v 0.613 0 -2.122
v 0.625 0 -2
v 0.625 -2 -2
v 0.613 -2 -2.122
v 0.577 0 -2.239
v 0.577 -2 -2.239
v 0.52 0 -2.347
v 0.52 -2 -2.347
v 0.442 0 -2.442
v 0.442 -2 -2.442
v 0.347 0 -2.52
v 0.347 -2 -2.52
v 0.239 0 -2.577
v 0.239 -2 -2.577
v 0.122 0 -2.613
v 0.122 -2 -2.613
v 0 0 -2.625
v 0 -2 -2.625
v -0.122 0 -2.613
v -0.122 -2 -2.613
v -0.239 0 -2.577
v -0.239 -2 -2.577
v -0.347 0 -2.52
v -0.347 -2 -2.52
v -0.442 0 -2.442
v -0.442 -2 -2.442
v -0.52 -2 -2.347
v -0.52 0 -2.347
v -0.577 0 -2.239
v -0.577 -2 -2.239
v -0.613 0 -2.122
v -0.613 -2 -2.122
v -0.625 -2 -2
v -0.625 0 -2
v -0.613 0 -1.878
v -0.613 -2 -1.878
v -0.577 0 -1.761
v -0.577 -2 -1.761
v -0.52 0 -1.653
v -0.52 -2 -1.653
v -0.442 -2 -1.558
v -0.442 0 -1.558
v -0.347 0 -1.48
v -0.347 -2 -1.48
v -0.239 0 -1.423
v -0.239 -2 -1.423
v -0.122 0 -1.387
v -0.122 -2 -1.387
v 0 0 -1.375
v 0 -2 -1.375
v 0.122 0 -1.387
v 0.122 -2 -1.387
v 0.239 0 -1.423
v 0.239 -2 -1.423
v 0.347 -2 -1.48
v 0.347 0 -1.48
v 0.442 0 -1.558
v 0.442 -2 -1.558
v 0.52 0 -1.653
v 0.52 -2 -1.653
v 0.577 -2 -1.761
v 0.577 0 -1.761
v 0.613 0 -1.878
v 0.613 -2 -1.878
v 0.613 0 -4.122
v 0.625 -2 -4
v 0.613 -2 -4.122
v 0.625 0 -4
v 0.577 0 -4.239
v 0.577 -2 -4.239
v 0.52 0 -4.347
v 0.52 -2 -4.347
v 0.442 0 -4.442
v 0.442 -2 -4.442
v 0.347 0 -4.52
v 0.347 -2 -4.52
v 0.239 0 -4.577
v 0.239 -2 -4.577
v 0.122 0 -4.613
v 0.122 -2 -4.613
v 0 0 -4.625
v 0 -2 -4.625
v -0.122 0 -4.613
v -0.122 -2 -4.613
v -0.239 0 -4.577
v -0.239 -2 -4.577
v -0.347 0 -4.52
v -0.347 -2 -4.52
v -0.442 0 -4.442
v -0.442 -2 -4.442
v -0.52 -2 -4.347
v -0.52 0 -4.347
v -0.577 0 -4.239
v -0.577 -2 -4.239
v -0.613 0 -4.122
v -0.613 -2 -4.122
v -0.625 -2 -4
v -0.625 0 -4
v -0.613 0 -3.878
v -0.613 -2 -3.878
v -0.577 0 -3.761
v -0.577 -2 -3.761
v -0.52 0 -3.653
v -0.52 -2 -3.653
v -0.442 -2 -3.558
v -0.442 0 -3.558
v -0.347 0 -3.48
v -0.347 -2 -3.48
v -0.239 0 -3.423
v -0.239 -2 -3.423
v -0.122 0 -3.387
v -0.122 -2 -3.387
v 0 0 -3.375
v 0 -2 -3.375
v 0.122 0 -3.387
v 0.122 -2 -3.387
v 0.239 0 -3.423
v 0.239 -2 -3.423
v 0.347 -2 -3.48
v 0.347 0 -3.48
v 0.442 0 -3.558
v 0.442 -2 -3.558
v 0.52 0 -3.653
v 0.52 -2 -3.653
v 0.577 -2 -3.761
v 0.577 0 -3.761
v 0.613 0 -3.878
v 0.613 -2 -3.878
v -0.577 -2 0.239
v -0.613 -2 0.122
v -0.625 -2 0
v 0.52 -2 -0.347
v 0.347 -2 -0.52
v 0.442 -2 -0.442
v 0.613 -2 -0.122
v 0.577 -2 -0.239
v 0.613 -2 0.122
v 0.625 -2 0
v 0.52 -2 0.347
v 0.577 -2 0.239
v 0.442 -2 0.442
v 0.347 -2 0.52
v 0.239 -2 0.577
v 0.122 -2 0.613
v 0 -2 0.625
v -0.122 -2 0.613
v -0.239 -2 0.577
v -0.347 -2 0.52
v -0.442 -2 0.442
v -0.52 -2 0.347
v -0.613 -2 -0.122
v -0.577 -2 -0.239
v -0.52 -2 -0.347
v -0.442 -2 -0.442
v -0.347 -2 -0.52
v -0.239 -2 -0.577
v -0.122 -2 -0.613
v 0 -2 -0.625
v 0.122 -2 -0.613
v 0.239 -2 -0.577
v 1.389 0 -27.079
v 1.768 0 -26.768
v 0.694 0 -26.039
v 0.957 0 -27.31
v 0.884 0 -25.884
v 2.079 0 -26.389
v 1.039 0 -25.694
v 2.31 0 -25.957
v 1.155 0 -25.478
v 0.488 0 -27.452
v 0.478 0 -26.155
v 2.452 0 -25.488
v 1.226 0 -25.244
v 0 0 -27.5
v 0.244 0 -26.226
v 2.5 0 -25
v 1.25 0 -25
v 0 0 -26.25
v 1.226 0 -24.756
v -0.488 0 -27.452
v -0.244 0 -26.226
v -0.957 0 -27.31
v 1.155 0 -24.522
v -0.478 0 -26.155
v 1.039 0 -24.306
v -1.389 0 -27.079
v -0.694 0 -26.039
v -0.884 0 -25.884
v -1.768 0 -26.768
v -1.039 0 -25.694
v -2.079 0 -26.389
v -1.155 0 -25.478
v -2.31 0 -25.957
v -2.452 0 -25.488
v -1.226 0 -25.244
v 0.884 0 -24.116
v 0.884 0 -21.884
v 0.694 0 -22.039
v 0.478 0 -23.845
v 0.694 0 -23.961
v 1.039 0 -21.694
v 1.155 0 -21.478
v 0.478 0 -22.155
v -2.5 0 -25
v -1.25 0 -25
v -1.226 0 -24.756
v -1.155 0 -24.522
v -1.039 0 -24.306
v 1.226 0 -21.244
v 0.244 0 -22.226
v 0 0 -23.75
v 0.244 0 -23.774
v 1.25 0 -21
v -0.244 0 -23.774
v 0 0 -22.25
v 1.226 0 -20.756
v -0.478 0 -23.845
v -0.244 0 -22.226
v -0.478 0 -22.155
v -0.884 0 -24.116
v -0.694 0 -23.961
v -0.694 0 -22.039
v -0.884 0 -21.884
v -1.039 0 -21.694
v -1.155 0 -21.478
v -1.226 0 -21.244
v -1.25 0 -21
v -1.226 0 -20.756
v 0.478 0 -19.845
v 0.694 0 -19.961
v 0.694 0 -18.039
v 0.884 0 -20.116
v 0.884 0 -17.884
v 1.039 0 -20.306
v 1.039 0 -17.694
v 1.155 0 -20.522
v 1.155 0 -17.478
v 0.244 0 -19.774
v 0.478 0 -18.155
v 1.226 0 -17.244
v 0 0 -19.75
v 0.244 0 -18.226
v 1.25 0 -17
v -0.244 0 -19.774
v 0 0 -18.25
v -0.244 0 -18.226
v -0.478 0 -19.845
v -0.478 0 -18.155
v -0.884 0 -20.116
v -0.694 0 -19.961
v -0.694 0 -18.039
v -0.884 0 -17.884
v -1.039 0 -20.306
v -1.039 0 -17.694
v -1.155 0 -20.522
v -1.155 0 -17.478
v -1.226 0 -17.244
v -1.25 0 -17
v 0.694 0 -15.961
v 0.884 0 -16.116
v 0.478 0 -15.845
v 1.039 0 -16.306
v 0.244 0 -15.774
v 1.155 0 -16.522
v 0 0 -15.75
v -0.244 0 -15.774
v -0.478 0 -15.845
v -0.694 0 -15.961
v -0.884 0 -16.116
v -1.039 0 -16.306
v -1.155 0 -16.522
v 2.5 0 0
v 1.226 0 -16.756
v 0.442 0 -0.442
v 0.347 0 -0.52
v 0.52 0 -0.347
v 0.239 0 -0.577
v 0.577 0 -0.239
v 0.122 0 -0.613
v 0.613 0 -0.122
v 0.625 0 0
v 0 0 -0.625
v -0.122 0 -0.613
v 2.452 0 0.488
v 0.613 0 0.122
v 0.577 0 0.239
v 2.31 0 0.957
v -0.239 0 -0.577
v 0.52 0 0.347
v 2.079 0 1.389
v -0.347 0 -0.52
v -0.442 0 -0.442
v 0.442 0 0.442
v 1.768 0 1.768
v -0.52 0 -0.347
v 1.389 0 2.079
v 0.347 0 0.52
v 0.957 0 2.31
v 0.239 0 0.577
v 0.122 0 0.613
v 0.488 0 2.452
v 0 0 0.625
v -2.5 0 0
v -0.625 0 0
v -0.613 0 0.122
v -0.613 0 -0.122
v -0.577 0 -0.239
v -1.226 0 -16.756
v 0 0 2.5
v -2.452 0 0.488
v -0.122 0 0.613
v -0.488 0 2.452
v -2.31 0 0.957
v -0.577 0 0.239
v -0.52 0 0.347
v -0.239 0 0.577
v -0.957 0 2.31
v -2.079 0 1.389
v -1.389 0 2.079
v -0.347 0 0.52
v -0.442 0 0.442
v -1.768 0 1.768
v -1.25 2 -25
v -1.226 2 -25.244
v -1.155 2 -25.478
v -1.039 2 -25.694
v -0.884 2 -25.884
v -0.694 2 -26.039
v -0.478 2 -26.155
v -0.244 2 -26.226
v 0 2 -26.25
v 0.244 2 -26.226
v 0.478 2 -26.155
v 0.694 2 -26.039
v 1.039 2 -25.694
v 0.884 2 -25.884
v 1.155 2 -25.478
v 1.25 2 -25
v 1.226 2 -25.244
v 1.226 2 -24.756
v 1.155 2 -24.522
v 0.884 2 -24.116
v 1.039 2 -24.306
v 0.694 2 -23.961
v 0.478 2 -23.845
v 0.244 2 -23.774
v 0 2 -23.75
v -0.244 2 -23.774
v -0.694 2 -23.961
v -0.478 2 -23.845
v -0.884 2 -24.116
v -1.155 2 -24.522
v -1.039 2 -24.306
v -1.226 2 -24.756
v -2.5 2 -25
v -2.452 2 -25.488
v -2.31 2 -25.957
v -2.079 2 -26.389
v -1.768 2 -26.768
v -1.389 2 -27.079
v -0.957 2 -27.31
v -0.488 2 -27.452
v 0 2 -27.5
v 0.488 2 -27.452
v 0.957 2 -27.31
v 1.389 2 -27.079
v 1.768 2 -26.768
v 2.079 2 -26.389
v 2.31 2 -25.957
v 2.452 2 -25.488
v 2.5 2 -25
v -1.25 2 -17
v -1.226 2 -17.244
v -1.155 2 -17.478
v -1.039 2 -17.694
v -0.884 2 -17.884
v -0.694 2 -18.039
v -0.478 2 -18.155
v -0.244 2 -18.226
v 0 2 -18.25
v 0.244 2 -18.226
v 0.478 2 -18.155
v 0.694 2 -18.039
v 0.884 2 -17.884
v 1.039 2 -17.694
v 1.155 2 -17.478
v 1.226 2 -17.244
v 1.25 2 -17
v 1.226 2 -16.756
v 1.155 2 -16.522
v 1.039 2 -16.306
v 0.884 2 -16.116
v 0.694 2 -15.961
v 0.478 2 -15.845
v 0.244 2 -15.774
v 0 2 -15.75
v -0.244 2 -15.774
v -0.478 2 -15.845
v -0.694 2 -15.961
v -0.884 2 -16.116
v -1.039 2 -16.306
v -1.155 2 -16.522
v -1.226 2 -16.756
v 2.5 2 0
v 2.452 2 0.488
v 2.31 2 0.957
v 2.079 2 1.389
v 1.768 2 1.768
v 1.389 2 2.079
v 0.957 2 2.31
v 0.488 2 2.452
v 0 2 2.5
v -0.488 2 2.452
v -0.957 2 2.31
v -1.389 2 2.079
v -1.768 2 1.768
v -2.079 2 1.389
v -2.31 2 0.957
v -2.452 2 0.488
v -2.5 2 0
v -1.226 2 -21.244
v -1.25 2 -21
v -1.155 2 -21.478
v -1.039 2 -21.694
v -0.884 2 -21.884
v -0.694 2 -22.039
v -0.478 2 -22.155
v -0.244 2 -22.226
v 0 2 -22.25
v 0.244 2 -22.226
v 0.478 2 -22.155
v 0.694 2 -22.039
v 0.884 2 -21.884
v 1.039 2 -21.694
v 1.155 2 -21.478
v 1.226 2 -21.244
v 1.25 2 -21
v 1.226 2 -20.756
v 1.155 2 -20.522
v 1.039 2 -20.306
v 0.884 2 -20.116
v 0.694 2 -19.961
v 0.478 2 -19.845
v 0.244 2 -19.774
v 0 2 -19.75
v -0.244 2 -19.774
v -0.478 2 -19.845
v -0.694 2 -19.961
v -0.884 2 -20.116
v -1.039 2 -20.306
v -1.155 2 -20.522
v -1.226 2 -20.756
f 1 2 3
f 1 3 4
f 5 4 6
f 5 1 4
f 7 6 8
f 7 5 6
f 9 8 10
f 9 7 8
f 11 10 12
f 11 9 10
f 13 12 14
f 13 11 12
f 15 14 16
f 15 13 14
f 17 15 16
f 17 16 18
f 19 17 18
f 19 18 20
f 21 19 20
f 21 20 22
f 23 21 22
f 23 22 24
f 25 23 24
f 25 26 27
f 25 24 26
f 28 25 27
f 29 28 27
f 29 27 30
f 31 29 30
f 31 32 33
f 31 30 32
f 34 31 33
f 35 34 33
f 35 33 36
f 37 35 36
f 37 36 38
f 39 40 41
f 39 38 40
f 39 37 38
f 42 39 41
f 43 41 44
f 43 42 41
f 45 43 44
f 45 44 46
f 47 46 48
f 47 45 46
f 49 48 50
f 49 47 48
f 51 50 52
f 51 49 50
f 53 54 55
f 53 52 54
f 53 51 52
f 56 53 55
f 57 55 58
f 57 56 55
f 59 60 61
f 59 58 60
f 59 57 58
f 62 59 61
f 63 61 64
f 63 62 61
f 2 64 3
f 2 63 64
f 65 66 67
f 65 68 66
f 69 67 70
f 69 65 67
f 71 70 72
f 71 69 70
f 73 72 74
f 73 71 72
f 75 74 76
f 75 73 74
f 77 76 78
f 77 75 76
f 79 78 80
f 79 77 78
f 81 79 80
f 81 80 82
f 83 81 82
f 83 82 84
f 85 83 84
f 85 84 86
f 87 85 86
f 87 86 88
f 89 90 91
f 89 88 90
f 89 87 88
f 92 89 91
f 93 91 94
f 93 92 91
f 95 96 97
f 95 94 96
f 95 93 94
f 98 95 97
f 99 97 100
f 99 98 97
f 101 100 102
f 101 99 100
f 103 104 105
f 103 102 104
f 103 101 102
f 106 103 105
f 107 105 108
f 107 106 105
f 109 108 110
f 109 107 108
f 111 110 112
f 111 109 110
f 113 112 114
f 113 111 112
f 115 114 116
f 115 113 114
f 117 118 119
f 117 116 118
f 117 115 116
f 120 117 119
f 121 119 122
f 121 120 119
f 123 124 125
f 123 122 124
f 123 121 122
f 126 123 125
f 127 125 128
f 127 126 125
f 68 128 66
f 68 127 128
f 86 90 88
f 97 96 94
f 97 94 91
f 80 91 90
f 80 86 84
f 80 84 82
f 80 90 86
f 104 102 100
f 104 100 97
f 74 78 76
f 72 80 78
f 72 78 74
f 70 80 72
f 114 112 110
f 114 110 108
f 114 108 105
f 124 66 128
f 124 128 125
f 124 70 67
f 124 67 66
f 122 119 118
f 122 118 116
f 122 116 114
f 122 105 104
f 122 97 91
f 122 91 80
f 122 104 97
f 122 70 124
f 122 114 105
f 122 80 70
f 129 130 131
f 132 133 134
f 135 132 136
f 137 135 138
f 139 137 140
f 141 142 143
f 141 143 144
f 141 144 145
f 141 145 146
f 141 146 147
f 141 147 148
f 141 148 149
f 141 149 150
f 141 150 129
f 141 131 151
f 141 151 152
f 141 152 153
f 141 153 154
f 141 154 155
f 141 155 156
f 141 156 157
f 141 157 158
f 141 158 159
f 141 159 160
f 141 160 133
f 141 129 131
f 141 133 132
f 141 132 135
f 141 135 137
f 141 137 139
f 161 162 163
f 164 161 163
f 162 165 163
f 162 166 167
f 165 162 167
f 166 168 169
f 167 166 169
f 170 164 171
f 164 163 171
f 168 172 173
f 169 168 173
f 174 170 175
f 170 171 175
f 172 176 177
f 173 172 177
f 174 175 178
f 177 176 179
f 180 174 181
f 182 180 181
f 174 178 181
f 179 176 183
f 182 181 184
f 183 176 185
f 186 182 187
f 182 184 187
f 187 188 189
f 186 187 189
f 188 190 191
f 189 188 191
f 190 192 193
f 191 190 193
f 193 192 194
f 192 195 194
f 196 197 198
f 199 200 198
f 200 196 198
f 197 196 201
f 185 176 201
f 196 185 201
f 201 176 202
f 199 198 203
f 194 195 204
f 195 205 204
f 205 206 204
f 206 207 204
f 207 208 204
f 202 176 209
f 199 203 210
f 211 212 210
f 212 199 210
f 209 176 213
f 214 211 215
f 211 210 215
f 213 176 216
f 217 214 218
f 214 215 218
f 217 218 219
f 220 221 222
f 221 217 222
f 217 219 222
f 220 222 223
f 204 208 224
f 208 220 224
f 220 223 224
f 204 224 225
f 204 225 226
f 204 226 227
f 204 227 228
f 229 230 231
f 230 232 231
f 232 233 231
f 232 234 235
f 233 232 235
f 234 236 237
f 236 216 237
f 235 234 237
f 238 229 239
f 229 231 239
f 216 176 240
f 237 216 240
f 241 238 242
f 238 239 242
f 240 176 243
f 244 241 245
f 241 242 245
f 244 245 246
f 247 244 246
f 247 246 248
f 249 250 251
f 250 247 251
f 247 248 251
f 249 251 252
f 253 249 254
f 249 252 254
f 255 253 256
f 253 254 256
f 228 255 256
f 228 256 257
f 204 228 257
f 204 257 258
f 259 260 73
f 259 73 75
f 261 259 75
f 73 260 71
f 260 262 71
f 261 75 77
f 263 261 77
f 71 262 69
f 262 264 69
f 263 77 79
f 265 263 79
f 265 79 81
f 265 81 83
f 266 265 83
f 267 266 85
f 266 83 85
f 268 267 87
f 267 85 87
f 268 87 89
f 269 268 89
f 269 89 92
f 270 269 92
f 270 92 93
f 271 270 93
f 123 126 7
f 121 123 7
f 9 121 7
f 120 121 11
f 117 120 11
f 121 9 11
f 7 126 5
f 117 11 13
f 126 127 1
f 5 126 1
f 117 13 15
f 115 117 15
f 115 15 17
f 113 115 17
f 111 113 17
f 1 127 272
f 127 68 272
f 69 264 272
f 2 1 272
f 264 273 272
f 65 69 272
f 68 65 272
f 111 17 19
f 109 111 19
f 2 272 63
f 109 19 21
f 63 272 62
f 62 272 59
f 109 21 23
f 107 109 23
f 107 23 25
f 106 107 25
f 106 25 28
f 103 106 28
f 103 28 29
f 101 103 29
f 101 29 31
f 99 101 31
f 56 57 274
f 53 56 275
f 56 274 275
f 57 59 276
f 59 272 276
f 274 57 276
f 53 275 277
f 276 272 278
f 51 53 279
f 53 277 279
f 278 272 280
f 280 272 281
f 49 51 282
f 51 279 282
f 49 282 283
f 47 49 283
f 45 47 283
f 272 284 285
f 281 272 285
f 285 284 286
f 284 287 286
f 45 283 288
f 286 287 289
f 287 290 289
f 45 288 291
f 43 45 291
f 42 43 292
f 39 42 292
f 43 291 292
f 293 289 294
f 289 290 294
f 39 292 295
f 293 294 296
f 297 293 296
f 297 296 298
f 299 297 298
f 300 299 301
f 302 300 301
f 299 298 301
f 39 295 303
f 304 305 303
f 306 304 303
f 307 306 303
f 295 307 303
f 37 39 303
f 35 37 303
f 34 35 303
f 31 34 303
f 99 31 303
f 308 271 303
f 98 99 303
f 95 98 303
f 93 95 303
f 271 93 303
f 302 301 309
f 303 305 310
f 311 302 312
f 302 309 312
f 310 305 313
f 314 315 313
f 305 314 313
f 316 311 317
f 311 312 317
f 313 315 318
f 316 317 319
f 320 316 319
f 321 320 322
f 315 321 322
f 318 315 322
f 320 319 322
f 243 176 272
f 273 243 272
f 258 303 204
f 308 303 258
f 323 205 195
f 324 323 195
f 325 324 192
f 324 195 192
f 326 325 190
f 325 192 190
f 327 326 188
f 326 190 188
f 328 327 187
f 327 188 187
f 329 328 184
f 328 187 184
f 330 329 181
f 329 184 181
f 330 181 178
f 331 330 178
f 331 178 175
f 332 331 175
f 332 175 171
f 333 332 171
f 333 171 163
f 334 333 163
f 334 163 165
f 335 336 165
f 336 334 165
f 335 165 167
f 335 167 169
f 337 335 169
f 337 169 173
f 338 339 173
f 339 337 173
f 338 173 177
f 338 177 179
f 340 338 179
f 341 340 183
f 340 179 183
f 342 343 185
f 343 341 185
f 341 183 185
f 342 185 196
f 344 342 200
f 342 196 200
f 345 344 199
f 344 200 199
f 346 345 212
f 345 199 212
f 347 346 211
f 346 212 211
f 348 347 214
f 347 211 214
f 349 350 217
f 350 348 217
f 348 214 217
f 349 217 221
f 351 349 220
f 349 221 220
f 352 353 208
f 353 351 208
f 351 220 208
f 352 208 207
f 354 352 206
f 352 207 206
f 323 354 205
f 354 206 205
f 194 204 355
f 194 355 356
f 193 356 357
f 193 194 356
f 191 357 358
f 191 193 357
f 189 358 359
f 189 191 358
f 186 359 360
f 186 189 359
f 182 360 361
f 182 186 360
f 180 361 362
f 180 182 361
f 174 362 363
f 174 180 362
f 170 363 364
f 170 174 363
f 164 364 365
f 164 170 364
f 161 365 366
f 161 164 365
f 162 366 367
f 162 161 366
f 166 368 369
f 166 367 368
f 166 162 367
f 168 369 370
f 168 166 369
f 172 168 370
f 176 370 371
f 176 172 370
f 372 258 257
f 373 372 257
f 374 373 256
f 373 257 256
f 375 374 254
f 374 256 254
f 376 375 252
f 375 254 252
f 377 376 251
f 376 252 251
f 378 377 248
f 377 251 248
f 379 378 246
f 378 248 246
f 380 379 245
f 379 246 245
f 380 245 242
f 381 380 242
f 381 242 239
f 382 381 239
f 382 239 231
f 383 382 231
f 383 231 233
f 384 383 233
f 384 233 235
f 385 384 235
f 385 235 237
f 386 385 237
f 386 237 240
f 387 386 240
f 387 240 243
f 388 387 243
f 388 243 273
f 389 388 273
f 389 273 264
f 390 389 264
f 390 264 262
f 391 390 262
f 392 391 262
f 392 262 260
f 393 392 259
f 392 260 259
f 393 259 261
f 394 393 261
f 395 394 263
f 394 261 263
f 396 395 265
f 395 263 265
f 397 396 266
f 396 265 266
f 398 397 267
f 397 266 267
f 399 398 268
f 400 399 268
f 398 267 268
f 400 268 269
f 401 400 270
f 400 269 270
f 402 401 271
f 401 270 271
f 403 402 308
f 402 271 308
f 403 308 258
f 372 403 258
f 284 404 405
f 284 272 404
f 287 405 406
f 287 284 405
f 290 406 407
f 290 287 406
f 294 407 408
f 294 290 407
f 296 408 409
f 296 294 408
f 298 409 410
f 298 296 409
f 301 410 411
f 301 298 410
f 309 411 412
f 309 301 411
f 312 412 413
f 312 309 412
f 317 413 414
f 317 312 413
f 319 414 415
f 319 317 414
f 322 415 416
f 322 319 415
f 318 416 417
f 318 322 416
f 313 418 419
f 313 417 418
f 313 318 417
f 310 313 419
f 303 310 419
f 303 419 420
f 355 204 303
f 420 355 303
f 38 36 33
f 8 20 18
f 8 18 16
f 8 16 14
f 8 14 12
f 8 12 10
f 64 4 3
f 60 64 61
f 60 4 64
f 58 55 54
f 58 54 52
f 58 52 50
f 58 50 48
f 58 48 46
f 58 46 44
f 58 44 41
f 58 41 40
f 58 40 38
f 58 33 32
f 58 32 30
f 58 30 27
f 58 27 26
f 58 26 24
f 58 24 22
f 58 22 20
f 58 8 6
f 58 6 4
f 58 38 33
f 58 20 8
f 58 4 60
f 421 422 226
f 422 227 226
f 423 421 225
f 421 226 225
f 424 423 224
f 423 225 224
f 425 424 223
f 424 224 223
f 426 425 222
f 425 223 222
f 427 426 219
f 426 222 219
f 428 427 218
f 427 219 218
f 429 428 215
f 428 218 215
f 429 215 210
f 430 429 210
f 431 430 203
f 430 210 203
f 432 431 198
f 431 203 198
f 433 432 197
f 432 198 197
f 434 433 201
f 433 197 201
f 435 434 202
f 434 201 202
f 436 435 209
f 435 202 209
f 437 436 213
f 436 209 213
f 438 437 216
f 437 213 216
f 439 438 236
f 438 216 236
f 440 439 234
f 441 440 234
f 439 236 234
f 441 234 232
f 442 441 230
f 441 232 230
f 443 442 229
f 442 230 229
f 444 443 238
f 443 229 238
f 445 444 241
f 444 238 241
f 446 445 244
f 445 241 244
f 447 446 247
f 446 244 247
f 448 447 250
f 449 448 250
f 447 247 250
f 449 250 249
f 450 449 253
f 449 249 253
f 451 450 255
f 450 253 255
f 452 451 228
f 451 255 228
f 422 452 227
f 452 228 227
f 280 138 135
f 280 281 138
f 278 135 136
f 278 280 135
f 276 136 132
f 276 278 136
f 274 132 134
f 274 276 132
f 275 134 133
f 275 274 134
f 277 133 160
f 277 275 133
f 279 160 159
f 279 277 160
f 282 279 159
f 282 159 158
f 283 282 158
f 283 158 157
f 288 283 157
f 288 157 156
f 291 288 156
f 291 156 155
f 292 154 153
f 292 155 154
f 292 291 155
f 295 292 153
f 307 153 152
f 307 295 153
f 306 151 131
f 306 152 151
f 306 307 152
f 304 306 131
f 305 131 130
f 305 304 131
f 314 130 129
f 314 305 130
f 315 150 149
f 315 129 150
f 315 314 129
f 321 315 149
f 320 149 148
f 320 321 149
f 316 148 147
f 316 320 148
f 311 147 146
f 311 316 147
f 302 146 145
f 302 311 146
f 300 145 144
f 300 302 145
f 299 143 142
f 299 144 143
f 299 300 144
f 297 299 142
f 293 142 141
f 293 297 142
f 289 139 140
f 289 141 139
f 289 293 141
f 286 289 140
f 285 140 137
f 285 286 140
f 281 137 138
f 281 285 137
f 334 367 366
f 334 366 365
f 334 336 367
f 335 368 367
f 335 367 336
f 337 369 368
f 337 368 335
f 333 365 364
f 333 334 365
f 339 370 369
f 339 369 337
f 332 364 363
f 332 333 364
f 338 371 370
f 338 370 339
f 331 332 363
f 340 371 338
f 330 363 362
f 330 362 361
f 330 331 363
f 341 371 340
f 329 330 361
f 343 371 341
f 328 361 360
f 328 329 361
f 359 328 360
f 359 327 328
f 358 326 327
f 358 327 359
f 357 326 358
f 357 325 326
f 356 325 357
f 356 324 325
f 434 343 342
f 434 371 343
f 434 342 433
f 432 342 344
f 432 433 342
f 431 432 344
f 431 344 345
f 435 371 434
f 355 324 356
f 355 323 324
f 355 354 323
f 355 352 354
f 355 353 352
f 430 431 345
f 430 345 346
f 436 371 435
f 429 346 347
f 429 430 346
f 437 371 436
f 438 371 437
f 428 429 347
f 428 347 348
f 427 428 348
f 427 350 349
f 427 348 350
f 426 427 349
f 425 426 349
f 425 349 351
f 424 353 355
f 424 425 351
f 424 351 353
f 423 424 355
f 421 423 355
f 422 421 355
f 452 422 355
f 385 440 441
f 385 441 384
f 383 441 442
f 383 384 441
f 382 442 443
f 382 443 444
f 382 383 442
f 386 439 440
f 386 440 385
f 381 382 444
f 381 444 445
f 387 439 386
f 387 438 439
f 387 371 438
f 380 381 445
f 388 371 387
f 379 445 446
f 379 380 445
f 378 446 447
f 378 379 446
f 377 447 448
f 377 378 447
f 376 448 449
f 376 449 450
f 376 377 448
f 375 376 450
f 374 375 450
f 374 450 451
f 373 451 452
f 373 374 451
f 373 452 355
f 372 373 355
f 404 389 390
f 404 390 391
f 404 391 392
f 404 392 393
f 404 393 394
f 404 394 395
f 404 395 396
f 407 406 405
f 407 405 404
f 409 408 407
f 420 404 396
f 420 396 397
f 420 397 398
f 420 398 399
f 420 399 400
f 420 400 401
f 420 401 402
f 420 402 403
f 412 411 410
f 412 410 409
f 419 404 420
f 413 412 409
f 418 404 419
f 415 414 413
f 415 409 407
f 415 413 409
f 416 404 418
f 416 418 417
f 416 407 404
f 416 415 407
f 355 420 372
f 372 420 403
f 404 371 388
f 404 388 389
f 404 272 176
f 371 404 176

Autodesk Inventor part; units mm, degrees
ref_plane "YZ Plane" through (0, 0, 0) normal (1, 0, 0) x (0, 1, 0)
ref_plane "XZ Plane" through (0, 0, 0) normal (0, 1, 0) x (-1, 0, 0)
ref_plane "XY Plane" through (0, 0, 0) normal (0, 0, 1) x (1, 0, 0)
sketch "Sketch1" plane through (0, 0, 0) normal (0, 1, 0) x (-1, 0, 0)
  circle A0 centre (0, 0) radius 2.5
  line L0 (0, 0) -> (0, -25)
  line L1 (0, 0) -> (25, 0) construction
  circle A1 centre (0, -25) radius 2.5
  line L2 (2.5, -25) -> (2.5, 0)
  line L3 (-2.5, 0) -> (-2.5, -25)
  circle A2 centre (0, -25) radius 1.25
  circle A3 centre (0, -21) radius 1.25
  circle A4 centre (0, -17) radius 1.25
  dimension "d0" = 5
  dimension "d1" = 25
  dimension "d2" = 90
  dimension "d3" = 5
  dimension "d4" = 2.5
  dimension "d7" = 4
extrude "Extrusion1" add sketch "Sketch1" along normal blind 2 contours A0 | L2 A1 L0 A3 A4 A0 | A0 L0 A4 A3 A1 L3 | A1
sketch "Sketch2" plane through (0, 0, 0) normal (0, -1, 0) x (1, 0, 0)
  circle A0 centre (0, 0) radius 0.625
  line L0 (2.5, 0) -> (2.5, -25) projected
  circle A1 centre (0, -2) radius 0.625
  circle A2 centre (0, -4) radius 0.625
  dimension "d14" = 1.25
  dimension "d17" = 2
extrude "Extrusion2" add sketch "Sketch2" along normal blind 2
properties part number "Servo Extension Small"
